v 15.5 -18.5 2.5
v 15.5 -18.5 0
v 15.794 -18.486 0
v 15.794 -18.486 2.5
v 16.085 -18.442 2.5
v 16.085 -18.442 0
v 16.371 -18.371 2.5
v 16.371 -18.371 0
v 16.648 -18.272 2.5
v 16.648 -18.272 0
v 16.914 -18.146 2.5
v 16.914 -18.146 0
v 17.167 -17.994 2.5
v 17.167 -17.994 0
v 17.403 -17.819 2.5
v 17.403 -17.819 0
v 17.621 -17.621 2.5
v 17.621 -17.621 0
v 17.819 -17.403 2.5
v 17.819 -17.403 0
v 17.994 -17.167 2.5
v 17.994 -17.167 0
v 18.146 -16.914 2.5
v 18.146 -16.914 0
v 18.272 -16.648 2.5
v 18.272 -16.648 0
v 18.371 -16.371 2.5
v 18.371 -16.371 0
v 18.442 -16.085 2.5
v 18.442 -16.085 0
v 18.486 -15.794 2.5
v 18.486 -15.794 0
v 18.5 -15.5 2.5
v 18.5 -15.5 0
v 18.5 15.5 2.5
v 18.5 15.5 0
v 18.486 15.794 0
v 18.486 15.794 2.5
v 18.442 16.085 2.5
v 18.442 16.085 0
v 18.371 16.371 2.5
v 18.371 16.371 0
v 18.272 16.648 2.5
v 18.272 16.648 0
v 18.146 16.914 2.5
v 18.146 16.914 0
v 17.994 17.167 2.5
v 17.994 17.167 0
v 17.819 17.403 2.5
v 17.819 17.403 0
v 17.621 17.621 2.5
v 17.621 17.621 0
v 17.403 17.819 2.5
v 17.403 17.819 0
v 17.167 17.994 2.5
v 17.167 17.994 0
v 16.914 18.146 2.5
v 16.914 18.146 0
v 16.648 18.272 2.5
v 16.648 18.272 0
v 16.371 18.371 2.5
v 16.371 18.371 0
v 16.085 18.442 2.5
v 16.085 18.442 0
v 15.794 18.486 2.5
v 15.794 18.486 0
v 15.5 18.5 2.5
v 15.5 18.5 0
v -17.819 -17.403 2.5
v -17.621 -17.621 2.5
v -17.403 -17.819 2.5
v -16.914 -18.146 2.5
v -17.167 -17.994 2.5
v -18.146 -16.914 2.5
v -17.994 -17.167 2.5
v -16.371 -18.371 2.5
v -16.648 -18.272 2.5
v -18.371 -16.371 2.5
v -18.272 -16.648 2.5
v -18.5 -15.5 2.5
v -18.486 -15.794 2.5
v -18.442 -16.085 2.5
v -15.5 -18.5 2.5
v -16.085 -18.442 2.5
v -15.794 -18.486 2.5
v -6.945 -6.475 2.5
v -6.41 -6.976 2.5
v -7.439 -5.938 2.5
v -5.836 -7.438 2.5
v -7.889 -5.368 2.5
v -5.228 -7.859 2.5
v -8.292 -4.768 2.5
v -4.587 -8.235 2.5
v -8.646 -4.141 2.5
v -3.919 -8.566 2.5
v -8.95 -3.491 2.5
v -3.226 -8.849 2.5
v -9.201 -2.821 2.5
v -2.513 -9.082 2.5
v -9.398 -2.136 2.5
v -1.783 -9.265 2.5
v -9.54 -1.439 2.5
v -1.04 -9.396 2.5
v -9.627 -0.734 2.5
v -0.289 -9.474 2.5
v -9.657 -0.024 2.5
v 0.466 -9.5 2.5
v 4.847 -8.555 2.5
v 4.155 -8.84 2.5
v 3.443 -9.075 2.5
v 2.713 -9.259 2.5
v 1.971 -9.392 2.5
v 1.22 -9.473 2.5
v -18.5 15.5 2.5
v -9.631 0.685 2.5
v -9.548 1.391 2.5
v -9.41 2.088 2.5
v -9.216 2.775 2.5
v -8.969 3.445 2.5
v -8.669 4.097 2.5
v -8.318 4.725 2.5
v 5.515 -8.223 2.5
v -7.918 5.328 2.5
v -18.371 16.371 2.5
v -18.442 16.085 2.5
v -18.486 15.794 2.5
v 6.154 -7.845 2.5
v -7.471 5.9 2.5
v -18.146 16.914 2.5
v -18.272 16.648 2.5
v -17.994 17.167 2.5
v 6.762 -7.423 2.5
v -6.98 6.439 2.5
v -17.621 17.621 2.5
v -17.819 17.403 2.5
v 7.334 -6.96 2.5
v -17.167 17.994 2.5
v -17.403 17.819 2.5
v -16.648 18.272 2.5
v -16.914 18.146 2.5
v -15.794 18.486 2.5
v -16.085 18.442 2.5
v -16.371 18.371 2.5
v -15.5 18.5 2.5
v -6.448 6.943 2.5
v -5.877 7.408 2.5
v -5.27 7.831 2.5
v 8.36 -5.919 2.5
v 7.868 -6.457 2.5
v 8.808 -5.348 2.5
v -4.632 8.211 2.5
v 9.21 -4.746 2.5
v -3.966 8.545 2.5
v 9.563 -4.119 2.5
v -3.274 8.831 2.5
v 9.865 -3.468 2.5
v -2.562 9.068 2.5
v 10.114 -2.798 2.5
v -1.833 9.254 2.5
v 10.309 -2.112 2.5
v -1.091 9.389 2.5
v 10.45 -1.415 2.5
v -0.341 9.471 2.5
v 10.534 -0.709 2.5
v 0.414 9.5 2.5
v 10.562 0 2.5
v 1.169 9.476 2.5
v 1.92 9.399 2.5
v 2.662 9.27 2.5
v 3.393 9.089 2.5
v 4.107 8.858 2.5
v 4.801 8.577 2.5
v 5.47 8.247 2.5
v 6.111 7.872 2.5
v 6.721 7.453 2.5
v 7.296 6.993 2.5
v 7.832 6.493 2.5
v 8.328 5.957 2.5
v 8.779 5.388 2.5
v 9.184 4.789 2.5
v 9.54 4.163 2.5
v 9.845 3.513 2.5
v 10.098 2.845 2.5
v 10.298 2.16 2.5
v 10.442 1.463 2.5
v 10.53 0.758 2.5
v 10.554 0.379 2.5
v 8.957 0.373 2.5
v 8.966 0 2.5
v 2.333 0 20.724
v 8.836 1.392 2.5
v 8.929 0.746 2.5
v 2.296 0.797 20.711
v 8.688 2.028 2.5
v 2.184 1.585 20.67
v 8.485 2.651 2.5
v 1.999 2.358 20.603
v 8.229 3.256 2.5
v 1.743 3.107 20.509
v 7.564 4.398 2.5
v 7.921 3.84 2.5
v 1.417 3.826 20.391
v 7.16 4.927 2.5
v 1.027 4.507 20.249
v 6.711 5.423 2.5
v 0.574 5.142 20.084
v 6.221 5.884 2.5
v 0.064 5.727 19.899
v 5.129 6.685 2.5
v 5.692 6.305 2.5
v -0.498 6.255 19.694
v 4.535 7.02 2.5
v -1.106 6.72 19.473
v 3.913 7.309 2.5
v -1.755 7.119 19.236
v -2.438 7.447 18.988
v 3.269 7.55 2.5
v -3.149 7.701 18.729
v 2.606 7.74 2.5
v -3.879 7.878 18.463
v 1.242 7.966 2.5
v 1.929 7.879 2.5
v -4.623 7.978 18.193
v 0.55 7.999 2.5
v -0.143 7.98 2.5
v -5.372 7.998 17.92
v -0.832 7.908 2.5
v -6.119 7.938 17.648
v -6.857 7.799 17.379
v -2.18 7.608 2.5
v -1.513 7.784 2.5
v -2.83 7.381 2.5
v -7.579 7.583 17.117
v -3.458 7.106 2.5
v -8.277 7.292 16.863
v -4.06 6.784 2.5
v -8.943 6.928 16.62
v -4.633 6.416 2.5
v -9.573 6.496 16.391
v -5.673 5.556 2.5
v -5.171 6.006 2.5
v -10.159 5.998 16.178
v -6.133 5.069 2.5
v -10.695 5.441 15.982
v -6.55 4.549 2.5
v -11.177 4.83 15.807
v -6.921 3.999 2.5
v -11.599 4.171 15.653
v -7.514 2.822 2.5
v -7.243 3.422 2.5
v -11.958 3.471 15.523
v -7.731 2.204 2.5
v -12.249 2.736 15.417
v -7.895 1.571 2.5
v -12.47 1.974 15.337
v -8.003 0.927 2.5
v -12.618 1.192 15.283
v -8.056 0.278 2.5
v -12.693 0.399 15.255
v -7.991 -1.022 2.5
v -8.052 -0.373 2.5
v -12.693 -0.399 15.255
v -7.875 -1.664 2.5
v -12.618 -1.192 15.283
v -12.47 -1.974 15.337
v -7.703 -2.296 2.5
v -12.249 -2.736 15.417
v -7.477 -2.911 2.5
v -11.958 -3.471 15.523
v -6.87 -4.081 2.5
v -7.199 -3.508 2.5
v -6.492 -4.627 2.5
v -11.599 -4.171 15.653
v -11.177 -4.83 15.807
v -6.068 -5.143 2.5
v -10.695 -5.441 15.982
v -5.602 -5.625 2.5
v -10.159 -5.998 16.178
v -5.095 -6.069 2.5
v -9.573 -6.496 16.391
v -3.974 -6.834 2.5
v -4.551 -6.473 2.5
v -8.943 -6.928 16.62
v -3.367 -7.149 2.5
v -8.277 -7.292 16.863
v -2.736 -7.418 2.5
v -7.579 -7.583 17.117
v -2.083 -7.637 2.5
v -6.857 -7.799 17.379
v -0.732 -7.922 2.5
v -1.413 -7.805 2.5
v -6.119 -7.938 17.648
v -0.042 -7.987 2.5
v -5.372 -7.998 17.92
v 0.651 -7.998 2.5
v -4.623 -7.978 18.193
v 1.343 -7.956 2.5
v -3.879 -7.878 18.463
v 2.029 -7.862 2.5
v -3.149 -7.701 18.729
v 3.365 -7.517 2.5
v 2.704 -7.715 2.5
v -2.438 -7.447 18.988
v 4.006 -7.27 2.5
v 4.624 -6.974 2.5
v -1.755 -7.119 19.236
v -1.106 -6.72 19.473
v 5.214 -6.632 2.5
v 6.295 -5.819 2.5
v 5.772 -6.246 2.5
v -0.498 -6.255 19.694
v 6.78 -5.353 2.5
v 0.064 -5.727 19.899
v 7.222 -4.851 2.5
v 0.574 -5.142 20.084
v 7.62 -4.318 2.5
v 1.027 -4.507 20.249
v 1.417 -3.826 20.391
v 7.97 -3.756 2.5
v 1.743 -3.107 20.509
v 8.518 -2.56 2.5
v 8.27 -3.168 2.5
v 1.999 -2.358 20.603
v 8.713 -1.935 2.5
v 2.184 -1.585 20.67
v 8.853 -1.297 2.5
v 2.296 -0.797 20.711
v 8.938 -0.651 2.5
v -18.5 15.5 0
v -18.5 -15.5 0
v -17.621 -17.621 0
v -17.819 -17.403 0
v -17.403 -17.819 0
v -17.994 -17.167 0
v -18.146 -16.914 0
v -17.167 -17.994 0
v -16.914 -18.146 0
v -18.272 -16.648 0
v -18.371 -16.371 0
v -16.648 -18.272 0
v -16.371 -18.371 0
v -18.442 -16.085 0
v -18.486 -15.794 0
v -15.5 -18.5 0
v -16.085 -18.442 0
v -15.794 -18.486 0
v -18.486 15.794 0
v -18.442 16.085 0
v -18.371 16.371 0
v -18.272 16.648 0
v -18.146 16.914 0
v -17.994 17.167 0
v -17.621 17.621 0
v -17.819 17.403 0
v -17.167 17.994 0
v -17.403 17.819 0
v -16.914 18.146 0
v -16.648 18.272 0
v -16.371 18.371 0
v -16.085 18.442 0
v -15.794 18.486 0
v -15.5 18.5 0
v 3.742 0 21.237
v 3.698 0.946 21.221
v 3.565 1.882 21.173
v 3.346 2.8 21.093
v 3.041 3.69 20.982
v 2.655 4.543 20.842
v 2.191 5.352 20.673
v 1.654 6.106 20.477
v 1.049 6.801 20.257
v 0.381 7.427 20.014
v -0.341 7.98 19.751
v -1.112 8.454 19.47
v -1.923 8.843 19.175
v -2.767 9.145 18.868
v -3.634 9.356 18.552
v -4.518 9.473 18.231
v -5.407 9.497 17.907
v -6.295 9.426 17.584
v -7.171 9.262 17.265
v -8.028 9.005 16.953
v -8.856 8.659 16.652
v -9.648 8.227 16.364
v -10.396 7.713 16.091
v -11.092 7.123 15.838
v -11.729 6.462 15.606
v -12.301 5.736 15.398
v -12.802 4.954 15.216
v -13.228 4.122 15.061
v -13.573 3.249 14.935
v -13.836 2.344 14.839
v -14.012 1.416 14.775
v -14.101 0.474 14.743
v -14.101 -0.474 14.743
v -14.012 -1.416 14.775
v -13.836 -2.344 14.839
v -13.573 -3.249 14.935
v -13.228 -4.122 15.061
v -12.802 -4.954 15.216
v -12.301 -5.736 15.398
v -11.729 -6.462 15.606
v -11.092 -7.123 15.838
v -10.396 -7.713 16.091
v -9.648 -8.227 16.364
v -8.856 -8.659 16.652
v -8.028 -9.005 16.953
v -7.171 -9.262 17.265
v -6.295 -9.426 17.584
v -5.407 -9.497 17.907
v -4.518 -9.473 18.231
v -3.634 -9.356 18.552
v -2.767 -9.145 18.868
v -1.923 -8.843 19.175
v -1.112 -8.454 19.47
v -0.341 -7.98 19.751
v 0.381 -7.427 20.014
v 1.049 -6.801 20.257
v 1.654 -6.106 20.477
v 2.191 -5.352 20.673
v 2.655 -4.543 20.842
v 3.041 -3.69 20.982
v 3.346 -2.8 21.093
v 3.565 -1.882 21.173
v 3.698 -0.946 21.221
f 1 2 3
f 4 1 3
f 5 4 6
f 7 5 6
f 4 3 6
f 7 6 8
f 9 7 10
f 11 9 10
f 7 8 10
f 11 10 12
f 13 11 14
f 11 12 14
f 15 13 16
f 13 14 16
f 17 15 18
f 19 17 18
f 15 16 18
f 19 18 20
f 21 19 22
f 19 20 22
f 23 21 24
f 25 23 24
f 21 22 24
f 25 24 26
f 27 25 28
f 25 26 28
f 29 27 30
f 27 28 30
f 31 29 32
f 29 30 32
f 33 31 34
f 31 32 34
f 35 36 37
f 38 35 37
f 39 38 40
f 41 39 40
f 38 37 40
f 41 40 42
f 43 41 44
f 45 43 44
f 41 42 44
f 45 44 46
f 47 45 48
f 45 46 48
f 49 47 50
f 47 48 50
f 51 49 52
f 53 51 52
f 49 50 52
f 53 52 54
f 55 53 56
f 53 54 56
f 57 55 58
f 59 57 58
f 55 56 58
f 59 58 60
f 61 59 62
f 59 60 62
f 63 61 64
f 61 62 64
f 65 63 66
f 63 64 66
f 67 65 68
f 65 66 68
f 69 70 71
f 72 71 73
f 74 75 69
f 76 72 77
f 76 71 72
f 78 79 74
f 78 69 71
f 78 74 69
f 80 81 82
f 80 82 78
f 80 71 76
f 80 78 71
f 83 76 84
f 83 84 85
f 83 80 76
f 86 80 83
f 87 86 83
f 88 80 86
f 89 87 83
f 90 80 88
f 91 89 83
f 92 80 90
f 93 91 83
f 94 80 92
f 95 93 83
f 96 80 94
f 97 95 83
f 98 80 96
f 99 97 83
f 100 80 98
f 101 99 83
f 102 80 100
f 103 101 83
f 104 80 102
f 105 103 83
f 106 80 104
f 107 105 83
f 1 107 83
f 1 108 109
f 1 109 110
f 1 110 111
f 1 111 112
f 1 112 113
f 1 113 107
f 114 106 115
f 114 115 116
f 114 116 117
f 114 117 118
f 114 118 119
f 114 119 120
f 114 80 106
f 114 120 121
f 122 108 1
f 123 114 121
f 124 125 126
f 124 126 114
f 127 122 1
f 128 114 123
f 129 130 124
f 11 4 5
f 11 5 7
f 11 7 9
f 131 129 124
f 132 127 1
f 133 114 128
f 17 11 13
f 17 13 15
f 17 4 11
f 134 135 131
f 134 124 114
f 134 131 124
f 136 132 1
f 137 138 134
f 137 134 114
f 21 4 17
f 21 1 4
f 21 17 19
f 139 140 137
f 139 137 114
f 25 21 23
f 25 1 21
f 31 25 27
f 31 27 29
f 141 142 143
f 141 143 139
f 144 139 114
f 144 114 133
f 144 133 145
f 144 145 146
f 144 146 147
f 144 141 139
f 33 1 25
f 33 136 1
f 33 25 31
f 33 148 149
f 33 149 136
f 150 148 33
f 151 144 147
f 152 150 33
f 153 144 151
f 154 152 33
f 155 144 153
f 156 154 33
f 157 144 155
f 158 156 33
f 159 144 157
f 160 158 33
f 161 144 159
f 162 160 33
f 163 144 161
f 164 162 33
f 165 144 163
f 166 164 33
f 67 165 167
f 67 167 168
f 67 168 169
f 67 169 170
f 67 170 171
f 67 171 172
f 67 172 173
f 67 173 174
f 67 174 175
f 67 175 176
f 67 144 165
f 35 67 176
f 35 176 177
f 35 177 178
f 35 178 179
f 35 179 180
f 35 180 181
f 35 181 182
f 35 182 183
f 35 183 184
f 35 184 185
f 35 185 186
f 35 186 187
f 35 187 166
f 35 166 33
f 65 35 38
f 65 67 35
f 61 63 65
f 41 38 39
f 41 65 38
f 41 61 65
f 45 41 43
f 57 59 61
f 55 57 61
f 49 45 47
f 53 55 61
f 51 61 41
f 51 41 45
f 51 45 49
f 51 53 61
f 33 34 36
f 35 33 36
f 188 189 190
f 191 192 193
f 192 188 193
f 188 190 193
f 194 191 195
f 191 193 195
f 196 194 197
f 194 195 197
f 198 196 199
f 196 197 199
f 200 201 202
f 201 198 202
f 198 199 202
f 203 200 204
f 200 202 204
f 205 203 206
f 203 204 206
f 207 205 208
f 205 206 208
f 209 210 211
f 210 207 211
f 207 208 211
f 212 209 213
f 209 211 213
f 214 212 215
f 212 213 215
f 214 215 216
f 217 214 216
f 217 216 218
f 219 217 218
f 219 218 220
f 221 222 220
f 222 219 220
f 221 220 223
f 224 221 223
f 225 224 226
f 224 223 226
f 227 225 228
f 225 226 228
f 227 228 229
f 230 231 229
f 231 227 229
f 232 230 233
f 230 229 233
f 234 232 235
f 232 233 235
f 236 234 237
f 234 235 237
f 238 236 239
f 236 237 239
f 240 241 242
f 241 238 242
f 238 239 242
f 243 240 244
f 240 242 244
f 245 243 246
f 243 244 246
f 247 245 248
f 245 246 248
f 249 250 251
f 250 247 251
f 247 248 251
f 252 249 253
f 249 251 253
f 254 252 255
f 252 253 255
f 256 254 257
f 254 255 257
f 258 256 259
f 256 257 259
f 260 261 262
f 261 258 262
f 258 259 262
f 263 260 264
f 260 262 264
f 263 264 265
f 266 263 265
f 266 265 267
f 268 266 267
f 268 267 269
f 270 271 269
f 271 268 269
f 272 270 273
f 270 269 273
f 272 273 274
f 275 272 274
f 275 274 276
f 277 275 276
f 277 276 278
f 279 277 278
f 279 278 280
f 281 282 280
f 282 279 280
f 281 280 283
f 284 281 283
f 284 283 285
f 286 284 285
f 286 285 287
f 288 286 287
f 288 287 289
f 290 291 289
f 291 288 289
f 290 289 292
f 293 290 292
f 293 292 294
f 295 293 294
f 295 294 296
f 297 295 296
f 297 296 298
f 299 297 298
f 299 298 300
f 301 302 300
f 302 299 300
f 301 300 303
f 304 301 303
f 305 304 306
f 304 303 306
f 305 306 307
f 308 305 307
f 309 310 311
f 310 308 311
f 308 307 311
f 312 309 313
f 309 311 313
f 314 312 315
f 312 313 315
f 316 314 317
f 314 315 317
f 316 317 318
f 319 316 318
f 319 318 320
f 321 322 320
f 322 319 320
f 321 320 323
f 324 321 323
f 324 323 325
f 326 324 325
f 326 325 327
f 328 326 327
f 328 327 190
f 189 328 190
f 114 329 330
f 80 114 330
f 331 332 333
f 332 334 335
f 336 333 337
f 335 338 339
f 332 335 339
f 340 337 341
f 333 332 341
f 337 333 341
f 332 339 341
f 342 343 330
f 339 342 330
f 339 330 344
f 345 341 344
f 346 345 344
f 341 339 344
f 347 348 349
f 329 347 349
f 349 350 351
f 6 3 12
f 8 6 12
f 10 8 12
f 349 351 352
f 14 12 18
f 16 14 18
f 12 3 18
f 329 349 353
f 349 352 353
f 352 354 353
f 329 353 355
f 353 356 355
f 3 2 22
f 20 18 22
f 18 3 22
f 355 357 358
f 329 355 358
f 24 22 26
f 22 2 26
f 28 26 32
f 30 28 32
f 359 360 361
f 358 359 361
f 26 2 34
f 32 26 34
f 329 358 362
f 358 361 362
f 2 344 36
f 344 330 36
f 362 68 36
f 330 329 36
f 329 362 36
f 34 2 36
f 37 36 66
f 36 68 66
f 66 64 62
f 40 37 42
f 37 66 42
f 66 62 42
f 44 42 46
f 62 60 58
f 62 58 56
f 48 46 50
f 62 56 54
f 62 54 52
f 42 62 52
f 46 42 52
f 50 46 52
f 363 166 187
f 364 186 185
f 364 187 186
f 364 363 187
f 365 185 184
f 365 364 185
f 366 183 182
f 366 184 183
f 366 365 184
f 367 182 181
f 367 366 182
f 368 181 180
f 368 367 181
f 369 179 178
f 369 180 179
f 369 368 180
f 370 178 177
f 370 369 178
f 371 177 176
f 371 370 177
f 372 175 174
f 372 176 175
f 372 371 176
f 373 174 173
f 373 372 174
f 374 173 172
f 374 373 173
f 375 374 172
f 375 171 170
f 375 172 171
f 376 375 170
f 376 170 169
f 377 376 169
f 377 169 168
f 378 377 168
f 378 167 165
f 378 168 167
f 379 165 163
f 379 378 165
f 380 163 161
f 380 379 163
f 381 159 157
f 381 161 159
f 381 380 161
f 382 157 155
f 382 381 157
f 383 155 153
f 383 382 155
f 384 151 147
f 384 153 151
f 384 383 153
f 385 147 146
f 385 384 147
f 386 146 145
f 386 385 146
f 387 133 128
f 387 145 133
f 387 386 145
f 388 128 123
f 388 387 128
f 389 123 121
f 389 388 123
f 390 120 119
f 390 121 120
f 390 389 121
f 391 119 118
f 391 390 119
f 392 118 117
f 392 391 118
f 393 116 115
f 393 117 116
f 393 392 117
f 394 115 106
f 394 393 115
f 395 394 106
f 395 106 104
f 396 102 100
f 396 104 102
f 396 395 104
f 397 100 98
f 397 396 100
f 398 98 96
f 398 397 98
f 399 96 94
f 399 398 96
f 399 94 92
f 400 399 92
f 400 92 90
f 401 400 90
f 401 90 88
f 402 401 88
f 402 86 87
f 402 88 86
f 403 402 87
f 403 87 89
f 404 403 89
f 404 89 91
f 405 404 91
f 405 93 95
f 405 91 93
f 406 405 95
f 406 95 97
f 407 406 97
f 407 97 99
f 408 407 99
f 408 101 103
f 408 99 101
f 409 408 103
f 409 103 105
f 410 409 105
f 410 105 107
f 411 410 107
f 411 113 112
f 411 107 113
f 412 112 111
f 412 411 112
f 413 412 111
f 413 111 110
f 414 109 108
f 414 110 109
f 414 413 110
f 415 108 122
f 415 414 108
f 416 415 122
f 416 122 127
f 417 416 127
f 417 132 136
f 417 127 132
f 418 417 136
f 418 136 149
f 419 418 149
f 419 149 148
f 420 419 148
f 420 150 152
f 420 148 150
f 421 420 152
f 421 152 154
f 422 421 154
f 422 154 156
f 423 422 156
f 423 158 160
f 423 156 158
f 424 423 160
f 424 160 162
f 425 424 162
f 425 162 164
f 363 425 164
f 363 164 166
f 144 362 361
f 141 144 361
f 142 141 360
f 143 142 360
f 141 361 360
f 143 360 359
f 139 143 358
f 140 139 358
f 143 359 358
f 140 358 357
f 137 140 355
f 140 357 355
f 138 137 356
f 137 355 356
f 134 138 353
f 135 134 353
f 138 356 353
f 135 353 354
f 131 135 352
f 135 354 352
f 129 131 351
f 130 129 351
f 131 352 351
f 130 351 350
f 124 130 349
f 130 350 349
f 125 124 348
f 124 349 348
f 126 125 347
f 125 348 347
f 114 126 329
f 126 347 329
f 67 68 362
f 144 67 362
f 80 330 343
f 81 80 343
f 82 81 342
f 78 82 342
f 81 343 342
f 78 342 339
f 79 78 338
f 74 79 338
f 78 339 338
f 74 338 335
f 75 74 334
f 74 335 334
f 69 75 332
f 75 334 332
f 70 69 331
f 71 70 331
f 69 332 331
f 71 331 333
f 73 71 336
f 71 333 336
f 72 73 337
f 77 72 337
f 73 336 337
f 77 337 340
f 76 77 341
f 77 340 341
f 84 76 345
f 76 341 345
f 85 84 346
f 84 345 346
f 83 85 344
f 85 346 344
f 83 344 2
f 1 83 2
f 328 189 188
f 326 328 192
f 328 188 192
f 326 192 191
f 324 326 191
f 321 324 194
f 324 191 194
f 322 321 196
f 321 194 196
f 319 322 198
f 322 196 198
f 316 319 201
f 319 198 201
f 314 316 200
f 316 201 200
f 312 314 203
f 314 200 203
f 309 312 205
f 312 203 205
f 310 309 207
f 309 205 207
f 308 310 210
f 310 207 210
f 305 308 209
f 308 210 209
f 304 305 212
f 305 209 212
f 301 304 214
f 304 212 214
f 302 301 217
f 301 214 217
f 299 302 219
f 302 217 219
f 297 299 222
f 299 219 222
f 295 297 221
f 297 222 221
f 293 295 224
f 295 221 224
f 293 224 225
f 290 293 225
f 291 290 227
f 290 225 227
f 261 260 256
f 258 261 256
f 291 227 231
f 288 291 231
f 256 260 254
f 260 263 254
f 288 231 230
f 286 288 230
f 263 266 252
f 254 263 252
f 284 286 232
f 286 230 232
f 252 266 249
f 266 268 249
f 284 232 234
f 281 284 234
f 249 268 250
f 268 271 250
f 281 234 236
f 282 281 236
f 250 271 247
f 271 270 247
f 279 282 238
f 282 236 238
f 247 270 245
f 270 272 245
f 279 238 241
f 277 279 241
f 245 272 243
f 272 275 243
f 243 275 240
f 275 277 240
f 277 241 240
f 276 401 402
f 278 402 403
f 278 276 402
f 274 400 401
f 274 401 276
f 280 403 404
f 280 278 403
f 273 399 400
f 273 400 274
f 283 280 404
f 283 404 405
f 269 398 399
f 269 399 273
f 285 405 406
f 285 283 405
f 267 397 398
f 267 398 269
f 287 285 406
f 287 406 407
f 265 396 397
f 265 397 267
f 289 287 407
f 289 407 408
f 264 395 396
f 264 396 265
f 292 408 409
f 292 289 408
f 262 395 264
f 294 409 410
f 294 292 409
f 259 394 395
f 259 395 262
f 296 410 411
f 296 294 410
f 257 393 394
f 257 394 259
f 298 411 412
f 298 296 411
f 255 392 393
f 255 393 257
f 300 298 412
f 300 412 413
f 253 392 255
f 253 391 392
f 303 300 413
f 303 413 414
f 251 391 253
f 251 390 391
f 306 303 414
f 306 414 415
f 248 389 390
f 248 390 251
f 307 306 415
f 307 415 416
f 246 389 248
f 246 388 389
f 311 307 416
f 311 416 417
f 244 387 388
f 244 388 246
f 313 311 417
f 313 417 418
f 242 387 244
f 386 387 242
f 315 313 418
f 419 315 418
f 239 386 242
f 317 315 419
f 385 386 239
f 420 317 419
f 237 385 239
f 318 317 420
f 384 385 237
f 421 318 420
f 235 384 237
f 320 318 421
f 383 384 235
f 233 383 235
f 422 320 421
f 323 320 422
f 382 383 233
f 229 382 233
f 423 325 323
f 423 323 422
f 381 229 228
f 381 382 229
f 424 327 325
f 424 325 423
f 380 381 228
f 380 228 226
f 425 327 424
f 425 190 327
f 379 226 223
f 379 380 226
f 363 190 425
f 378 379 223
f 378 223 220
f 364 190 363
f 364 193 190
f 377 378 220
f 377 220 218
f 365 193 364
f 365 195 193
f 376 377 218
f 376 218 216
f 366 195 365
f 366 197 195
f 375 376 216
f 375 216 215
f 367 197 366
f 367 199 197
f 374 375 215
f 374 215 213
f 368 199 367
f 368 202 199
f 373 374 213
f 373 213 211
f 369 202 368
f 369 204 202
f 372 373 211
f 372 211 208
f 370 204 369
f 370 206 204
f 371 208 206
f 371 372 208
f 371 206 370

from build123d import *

# Parameters (mm, degrees)
EXTRUDE_1_DEPTH     = 2.5
EXTRUDE_3_REACH     = 31.489
SKETCH_6_R          = 9.5
EXTRUDE_START       = 10
SKETCH_12_R         = 9.5
EXTRUDE_4_DEPTH     = 10
CUT_EXTRUDE_4_REACH = 37.632
SKETCH_13_R         = 8


with BuildPart() as part:
    # 草圖1 → 填料-伸長1 (new body)
    with BuildSketch(Plane.XY):
        with BuildLine():
            Line((-15.5, -18.5), (15.5, -18.5))
            ThreePointArc((15.5, -18.5), (17.621320344, -17.621320344), (18.5, -15.5))
            Line((18.5, -15.5), (18.5, 15.5))
            ThreePointArc((18.5, 15.5), (17.621320344, 17.621320344), (15.5, 18.5))
            Line((15.5, 18.5), (-15.5, 18.5))
            ThreePointArc((-15.5, 18.5), (-17.621320344, 17.621320344), (-18.5, 15.5))
            Line((-18.5, 15.5), (-18.5, -15.5))
            ThreePointArc((-18.5, -15.5), (-17.621320344, -17.621320344), (-15.5, -18.5))
        make_face()
    extrude(amount=EXTRUDE_1_DEPTH)

    # 填料-伸長3: up to this plane
    extrude_3_end = Plane(origin=(-15.5, 15.5, 2.5), z_dir=(0, 0, -1))
    # 草圖6 → 填料-伸長3 (add, up to the surface)
    with BuildSketch(Plane(origin=(-2.967573413, 0, 8.153340943), x_dir=(0, -1, 0), z_dir=(-0.34202014332566943, 0, 0.9396926207859081)), mode=Mode.PRIVATE) as extrude_3_sk1:
        with Locations(Location((0, 1.280349356, 0), (0, 0, 90))):
            Circle(SKETCH_6_R)
    extrude_3_tool1 = split(extrude(extrude_3_sk1.sketch, amount=-EXTRUDE_3_REACH, mode=Mode.PRIVATE), bisect_by=extrude_3_end, keep=Keep.BOTH, mode=Mode.PRIVATE)
    add(extrude_3_tool1.solids().sort_by_distance((-1.764439, 0, 8.591246))[0])

    # 草圖12 → 填料-伸長4 (add)
    with BuildSketch(Plane(origin=(-2.967573413, 0, 8.153340943), x_dir=(0.9396926207859082, 0, 0.3420201433256695), z_dir=(-0.3420201433256695, 0, 0.9396926207859082)).offset(EXTRUDE_START)):
        with Locations((1.280349356, 0)):
            Circle(SKETCH_12_R)
    extrude(amount=-EXTRUDE_4_DEPTH)

    # 除料-伸長4: up to this plane
    cut_extrude_4_end = Plane(origin=(-15.5, 15.5, 2.5), z_dir=(0, 0, -1))
    # 草圖13 → 除料-伸長4 (cut, up to the surface)
    with BuildSketch(Plane(origin=(-6.387774847, 0, 17.550267151), x_dir=(0.9396926207859082, 0, 0.3420201433256695), z_dir=(-0.3420201433256695, 0, 0.9396926207859082)), mode=Mode.PRIVATE) as cut_extrude_4_sk1:
        with Locations((1.280349356, 0)):
            Circle(SKETCH_13_R)
    cut_extrude_4_tool1 = split(extrude(cut_extrude_4_sk1.sketch, amount=-CUT_EXTRUDE_4_REACH, mode=Mode.PRIVATE), bisect_by=cut_extrude_4_end, keep=Keep.BOTH, mode=Mode.PRIVATE)
    add(cut_extrude_4_tool1.solids().sort_by_distance((-5.18464, 0, 17.988172))[0], mode=Mode.SUBTRACT)


solid = part.part
